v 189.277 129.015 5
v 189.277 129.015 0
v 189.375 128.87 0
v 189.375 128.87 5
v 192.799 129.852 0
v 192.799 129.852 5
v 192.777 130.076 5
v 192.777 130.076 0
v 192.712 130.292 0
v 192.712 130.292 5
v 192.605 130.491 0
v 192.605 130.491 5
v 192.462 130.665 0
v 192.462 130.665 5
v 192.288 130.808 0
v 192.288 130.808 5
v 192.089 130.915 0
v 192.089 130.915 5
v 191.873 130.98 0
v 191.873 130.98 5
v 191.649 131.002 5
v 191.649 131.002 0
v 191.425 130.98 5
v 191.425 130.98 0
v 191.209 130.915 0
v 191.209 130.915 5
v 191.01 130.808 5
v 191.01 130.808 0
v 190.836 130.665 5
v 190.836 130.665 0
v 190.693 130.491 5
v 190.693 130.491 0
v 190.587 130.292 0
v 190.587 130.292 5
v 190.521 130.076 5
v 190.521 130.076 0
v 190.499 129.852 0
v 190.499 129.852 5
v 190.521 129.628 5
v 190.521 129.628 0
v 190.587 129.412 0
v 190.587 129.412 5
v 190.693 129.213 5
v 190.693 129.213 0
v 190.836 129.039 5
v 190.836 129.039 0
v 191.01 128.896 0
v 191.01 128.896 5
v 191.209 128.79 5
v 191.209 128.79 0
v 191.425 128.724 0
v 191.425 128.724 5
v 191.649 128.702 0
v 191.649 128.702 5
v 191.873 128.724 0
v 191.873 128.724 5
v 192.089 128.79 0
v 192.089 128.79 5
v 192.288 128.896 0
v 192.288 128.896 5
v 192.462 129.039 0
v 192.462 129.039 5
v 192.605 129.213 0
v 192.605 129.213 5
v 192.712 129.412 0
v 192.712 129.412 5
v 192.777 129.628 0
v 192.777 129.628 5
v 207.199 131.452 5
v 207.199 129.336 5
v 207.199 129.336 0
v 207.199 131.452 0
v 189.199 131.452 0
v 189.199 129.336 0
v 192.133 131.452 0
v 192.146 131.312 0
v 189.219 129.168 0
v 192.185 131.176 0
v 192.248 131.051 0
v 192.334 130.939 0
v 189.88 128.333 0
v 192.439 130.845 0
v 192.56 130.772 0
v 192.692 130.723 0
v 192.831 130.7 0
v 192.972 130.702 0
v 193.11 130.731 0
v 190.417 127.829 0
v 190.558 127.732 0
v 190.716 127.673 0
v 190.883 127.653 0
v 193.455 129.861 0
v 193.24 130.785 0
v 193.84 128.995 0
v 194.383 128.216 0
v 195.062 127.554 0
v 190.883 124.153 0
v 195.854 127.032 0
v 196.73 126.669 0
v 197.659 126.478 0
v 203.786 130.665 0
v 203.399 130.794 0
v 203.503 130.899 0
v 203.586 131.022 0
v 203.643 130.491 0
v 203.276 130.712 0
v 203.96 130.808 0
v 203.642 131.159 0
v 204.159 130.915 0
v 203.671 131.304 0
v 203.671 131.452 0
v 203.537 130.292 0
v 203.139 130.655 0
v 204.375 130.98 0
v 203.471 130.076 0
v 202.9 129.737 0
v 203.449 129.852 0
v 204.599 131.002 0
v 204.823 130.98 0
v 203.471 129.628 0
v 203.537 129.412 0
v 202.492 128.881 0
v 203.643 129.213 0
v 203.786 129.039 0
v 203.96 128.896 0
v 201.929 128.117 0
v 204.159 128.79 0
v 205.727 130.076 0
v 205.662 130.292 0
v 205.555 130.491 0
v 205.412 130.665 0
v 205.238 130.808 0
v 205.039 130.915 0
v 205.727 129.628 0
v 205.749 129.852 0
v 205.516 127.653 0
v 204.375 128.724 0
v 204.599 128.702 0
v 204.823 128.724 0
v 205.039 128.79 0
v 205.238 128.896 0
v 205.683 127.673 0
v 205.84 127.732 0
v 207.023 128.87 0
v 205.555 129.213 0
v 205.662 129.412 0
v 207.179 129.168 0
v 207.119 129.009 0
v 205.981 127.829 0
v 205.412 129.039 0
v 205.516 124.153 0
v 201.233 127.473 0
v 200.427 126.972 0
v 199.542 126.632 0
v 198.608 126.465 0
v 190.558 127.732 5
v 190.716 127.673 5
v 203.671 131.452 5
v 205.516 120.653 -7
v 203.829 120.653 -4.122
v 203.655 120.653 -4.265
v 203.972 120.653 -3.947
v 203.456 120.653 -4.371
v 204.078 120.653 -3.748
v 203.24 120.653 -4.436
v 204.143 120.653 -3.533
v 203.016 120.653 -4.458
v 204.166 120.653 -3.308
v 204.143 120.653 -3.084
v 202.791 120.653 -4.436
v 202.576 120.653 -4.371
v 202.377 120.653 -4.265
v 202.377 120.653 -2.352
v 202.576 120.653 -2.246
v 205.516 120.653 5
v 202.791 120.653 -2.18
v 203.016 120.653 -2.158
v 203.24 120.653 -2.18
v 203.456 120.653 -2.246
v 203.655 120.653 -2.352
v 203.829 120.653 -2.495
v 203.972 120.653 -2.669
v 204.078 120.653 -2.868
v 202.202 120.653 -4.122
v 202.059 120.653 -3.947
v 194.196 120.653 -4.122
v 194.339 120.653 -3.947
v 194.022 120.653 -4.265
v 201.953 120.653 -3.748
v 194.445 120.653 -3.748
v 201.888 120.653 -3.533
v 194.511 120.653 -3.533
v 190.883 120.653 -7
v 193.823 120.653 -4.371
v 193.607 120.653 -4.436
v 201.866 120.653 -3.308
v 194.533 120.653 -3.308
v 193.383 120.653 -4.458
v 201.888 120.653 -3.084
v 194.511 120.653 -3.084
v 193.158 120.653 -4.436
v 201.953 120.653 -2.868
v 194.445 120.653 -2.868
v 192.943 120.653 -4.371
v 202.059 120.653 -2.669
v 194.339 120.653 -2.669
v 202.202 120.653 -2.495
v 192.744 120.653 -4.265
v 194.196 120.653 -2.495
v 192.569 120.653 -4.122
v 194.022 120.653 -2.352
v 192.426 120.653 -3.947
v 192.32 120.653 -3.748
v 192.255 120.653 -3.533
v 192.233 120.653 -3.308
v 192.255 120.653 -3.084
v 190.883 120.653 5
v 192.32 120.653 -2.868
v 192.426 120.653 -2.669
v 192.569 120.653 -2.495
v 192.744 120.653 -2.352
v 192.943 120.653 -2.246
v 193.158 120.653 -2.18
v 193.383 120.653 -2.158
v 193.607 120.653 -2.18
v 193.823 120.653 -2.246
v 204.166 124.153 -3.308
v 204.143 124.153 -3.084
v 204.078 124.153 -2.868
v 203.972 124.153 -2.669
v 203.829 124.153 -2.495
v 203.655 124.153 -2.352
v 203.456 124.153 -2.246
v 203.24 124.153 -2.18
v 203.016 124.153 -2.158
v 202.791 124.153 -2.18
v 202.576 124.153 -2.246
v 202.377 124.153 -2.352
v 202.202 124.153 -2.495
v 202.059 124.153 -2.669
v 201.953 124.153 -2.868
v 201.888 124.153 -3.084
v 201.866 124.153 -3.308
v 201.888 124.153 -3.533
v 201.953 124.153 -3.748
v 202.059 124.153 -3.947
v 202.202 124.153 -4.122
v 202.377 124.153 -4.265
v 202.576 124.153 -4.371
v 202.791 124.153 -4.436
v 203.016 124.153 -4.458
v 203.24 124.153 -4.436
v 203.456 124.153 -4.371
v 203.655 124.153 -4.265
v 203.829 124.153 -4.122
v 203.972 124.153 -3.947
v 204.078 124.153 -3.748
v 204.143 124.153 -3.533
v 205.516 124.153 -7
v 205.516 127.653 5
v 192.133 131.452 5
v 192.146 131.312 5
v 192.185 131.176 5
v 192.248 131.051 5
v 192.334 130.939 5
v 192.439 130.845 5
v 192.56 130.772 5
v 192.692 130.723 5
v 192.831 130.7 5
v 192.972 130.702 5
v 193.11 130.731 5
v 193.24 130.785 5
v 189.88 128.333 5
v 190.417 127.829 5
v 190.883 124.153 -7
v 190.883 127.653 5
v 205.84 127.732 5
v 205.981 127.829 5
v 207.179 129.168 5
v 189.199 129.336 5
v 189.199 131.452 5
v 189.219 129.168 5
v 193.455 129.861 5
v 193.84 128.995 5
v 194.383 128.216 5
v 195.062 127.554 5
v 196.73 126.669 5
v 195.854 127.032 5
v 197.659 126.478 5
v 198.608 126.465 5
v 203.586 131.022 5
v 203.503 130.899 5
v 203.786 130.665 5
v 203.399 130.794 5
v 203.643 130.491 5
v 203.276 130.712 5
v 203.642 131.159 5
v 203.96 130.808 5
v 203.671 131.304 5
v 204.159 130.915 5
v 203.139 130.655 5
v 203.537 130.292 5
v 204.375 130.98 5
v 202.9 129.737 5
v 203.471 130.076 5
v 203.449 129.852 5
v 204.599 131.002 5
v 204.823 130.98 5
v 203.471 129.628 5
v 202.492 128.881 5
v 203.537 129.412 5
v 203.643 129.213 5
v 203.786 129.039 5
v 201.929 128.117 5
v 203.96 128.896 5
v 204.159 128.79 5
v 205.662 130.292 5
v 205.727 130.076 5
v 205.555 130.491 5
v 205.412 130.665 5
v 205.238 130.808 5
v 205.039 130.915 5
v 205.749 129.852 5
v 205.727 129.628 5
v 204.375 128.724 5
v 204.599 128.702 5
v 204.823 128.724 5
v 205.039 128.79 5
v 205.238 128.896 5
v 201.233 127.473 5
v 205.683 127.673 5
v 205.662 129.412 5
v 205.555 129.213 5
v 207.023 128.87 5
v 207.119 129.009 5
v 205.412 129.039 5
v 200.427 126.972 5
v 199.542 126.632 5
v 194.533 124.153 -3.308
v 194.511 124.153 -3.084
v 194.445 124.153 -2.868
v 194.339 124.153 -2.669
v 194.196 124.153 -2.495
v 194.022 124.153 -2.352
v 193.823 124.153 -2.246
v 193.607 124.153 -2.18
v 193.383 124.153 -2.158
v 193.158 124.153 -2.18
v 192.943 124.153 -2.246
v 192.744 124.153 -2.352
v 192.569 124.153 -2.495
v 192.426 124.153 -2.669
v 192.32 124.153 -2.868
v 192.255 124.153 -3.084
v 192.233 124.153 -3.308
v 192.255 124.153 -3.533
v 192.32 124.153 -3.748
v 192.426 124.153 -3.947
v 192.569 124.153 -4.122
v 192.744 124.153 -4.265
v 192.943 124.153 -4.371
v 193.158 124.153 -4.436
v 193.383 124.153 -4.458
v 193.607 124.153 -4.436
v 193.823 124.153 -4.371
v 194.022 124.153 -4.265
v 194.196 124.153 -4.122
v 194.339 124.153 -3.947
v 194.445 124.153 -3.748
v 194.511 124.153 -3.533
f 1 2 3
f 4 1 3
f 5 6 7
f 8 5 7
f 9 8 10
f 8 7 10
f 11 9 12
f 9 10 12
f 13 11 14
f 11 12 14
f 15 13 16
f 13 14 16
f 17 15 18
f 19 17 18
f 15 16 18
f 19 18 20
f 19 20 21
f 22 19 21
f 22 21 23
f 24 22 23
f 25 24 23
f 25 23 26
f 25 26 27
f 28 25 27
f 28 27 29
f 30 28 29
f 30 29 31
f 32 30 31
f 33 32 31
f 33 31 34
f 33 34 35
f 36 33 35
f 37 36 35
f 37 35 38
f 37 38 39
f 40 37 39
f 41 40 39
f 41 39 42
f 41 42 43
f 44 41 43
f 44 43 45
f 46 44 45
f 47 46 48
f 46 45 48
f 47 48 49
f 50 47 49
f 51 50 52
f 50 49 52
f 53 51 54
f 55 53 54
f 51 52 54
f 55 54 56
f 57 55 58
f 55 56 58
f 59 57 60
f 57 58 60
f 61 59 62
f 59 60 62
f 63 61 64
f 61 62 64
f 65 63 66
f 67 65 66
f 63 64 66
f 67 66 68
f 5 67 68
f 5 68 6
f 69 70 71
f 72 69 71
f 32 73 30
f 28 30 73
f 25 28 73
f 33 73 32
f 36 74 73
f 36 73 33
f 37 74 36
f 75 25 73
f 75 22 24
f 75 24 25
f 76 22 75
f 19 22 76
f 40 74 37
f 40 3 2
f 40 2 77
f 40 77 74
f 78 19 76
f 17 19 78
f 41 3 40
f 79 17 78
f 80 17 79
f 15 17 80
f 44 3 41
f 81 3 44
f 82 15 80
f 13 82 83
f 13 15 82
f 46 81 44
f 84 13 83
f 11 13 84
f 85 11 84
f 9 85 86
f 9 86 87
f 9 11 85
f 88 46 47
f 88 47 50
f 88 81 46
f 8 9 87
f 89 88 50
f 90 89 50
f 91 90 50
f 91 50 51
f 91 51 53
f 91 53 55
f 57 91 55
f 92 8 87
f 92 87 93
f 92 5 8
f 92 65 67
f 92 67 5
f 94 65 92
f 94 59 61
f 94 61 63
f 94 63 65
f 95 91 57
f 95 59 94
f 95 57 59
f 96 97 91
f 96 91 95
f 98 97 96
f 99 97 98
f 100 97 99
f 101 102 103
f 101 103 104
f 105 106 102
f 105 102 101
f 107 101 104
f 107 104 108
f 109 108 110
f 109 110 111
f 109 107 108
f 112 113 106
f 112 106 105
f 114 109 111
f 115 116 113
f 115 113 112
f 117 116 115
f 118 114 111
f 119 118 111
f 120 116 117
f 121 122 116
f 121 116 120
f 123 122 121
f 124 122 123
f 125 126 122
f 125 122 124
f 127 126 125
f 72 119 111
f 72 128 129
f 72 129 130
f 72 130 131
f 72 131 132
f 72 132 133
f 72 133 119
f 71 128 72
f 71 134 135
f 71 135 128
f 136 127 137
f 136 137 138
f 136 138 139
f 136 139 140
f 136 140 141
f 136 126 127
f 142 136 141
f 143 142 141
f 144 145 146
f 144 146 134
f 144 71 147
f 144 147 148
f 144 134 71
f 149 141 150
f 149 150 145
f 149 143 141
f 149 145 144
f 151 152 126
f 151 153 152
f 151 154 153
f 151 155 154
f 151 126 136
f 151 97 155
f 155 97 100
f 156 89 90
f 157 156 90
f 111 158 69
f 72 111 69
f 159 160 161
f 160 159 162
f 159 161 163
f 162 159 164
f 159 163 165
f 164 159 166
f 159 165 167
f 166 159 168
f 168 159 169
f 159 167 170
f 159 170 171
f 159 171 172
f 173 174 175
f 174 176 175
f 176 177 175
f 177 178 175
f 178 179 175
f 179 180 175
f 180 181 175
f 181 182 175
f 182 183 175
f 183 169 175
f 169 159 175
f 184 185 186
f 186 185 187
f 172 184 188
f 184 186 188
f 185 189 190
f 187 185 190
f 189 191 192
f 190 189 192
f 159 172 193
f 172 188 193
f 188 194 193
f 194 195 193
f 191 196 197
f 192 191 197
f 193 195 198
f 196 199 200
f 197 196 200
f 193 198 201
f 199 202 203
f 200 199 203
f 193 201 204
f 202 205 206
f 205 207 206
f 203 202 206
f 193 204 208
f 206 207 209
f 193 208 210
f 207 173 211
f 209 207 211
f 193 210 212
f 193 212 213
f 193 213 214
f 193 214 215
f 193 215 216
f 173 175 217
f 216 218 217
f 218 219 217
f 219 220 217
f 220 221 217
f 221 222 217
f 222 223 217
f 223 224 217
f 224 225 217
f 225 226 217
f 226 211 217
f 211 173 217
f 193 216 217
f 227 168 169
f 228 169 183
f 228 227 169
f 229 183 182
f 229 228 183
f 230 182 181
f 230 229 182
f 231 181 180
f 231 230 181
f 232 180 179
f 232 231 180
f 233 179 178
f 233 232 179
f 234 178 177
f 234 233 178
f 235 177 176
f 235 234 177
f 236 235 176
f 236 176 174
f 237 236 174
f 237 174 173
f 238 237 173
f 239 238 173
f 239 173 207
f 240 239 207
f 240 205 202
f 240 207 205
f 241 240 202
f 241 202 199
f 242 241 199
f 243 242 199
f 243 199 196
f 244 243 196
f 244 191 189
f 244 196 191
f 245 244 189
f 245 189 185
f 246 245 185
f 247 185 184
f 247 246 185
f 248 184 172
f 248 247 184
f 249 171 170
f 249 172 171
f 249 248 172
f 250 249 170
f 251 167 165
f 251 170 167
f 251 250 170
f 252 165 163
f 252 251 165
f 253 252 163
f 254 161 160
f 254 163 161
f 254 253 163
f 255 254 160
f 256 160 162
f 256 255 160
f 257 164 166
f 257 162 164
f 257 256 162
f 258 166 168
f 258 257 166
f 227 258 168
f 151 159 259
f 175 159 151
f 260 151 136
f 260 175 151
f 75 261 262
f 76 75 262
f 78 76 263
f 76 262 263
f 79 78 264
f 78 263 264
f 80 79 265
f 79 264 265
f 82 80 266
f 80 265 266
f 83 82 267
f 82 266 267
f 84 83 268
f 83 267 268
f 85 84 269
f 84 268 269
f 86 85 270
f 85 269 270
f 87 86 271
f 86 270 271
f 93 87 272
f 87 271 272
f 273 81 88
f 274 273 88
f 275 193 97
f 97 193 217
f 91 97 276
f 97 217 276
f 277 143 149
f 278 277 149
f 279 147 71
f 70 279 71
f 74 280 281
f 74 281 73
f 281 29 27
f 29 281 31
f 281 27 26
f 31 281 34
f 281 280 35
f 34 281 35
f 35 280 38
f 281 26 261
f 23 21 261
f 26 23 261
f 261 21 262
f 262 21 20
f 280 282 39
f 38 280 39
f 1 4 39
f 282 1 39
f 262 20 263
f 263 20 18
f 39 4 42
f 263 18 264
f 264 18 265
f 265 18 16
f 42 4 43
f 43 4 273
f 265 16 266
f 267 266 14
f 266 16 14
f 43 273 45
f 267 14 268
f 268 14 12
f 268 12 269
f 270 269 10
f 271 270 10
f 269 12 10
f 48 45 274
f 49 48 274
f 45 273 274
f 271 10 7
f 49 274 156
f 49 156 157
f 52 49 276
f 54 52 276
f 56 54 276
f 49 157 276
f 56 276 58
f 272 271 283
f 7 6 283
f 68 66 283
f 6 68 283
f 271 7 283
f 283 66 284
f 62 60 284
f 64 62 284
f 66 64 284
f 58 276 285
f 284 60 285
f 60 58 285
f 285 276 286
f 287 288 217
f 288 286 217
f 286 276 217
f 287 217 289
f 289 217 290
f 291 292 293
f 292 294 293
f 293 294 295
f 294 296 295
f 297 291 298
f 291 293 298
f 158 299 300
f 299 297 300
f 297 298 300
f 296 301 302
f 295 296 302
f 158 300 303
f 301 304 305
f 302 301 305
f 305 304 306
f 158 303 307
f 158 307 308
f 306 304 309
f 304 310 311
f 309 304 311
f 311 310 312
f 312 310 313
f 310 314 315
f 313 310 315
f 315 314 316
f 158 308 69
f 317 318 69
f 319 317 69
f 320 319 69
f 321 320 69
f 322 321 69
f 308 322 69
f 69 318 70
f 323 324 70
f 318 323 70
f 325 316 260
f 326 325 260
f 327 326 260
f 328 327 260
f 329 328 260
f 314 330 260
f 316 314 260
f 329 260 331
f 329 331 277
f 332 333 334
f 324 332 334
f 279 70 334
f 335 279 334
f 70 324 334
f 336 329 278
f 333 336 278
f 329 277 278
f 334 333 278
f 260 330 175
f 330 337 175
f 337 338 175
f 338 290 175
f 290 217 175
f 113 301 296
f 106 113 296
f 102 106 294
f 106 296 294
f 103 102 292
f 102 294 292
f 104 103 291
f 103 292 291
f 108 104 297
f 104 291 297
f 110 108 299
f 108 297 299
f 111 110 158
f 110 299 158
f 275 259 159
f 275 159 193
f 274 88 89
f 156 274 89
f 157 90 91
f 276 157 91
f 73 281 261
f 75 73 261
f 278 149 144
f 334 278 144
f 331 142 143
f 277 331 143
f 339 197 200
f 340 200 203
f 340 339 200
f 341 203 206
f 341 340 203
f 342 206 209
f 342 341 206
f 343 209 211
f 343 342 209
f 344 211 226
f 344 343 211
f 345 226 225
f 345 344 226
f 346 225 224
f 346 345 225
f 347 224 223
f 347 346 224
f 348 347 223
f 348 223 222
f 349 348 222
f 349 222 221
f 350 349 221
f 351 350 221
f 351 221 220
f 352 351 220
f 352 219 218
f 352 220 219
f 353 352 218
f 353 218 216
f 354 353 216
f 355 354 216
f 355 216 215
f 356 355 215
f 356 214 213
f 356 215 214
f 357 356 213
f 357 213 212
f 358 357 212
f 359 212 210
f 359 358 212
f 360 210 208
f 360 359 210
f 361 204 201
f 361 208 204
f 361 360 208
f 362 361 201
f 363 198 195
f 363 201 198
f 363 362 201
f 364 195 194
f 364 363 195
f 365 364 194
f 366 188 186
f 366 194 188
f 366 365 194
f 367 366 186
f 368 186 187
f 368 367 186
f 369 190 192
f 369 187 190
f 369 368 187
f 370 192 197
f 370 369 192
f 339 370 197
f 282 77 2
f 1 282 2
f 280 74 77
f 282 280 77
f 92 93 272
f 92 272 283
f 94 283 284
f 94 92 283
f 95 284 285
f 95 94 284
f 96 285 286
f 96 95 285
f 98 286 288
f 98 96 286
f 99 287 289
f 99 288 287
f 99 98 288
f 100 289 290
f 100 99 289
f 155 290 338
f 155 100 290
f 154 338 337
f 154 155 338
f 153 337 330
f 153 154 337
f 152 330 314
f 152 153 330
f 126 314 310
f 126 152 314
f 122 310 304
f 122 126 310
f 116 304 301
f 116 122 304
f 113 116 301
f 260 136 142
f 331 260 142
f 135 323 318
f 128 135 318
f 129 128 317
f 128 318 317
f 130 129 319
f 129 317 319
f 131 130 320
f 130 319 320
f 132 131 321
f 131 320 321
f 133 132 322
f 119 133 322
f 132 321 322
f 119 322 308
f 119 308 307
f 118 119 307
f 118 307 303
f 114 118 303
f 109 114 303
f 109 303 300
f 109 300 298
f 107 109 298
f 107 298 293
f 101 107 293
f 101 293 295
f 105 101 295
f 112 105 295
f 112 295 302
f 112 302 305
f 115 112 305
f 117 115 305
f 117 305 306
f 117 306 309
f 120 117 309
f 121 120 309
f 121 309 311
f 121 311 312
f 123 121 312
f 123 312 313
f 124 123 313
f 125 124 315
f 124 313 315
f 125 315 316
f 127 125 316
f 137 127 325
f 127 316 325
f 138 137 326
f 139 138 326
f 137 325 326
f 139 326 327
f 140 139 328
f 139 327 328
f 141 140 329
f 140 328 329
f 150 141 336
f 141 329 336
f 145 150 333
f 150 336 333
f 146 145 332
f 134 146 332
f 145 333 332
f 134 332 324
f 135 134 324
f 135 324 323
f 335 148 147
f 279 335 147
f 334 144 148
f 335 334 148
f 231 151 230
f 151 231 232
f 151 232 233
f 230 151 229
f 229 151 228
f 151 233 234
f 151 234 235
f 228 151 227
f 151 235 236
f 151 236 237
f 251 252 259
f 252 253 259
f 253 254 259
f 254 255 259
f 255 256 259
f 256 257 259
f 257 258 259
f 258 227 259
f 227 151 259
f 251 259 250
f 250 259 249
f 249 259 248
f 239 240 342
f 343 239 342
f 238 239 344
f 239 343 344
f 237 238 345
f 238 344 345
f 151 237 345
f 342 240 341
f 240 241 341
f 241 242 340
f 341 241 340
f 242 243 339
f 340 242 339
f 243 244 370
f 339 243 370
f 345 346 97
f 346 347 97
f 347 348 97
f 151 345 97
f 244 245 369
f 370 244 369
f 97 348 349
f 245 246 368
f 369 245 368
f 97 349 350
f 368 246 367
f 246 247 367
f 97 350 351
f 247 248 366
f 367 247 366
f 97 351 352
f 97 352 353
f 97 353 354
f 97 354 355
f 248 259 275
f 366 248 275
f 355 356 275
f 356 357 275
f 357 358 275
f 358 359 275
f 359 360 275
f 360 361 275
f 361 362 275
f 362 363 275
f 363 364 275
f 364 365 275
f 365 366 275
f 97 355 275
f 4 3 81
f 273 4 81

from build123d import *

# Parameters (mm, degrees)
FACE_2_DEPTH            = 5
SKETCH2_W               = 14.632926246
SKETCH2_H               = 5
BOSS_EXTRUDE2_DEPTH     = 7
SKETCH3_W               = 14.632926246
SKETCH3_H               = 7
BOSS_EXTRUDE3_DEPTH     = 7
EYE_HOLES_REACH         = 248.075
SKETCH4_R               = 1.15
SKETCH5_W               = 14.632926246
SKETCH5_H               = 3.5
SEAT_DEPTH              = 7
SKETCH6_W               = 18
SKETCH6_H               = 5
BOSS_EXTRUDE4_DEPTH     = 3.5
SKETCH7_W               = 18.025006546
SKETCH7_H               = 4.25
TOP_HOLE_DEPTH          = 248.972829901
MIDDLE_HOLE_DEPTH       = 246.672789516
MIDDLE_HOLE_DEPTH_BACK  = 246.672789516
SKETCH8_R               = 5.003684601
CUT_EXTRUDE8_DEPTH      = 208.598432106
CUT_EXTRUDE8_DEPTH_BACK = 3.5
SKETCH10_R              = 1.15
SKETCH11_R              = 0.754398486
CUT_EXTRUDE9_DEPTH      = 246.672789516


with BuildPart() as part:
    # Sketch1 → Face 2 (new body)
    with BuildSketch(Plane.XY):
        Polygon((189.199131389, 129.336090234), (189.219408928, 129.168352428), (189.276625012, 129.01501095), (189.375109043, 128.870497126), (189.879763338, 128.333185306), (190.417075159, 127.828531011), (190.558185088, 127.731803407), (190.715733881, 127.672634267), (190.882668266, 127.652553357), (205.515594512, 127.652553357), (205.683332318, 127.672830896), (205.84007769, 127.731803407), (205.98118762, 127.828531011), (207.023153735, 128.870497126), (207.118523911, 129.009007135), (207.17885385, 129.168352428), (207.199131389, 129.336090234), (207.199131389, 132.202042434), (189.199131389, 132.202042434), align=None)
    extrude(amount=FACE_2_DEPTH)

    # Sketch2 → Boss-Extrude2 (add)
    with BuildSketch(Plane.XZ.offset(-127.652553357)):
        with Locations((198.199131389, 2.5)):
            Rectangle(SKETCH2_W, SKETCH2_H)
    extrude(amount=BOSS_EXTRUDE2_DEPTH)

    # Sketch3 → Boss-Extrude3 (add)
    with BuildSketch(Plane(origin=(0, 0, 0), x_dir=(-1, 0, 0), z_dir=(0, 0, -1))):
        with Locations((-198.199131389, 124.152553357)):
            Rectangle(SKETCH3_W, SKETCH3_H)
    extrude(amount=BOSS_EXTRUDE3_DEPTH)

    # Sketch4 → Eye Holes (cut, up to next)
    with BuildSketch(Plane.XY.offset(5), mode=Mode.PRIVATE) as eye_holes_sk1:
        with Locations((191.649131389, 129.852042434)):
            Circle(SKETCH4_R)
    eye_holes_tool1 = extrude(eye_holes_sk1.sketch, amount=-EYE_HOLES_REACH, mode=Mode.PRIVATE) & part.part
    # Sketch4 → Eye Holes (cut, up to next)
    with BuildSketch(Plane.XY.offset(5), mode=Mode.PRIVATE) as eye_holes_sk2:
        with Locations((204.599131389, 129.852042434)):
            Circle(SKETCH4_R)
    eye_holes_tool2 = extrude(eye_holes_sk2.sketch, amount=-EYE_HOLES_REACH, mode=Mode.PRIVATE) & part.part
    add(eye_holes_tool1.solids().sort_by_distance((191.649131, 129.852042, 5))[0], mode=Mode.SUBTRACT)
    add(eye_holes_tool2.solids().sort_by_distance((204.599131, 129.852042, 5))[0], mode=Mode.SUBTRACT)

    # Sketch5 → Seat (cut)
    with BuildSketch(Plane(origin=(0, 0, -7), x_dir=(-1, 0, 0), z_dir=(0, 0, -1))):
        with Locations((-198.199131389, 125.902553357)):
            Rectangle(SKETCH5_W, SKETCH5_H)
    extrude(amount=-SEAT_DEPTH, mode=Mode.SUBTRACT)

    # Sketch6 → Boss-Extrude4 (add)
    with BuildSketch(Plane(origin=(0, 132.202042434, 0), x_dir=(1, 0, 0), z_dir=(0, 1, 0))):
        with Locations((198.199131389, -2.5)):
            Rectangle(SKETCH6_W, SKETCH6_H)
    extrude(amount=BOSS_EXTRUDE4_DEPTH)

    # Sketch7 → Top Hole (cut, through all)
    with BuildSketch(Plane.XY.offset(5)):
        with Locations((198.194207579, 133.577042434)):
            Rectangle(SKETCH7_W, SKETCH7_H)
    extrude(amount=-TOP_HOLE_DEPTH, mode=Mode.SUBTRACT)

    # Sketch8 → Middle Hole (cut, two sides: drawn at the far end of the back side and taken through both)
    with BuildSketch(Plane.XY.offset(5).offset(-MIDDLE_HOLE_DEPTH_BACK)):
        with Locations((198.199131389, 131.452042434)):
            Circle(SKETCH8_R)
    extrude(amount=MIDDLE_HOLE_DEPTH + MIDDLE_HOLE_DEPTH_BACK, mode=Mode.SUBTRACT)

    # Sketch10 → Cut-Extrude8 (cut, two sides: drawn at the far end of the back side and taken through both)
    with BuildSketch(Plane.XZ.offset(-120.652553357).offset(-CUT_EXTRUDE8_DEPTH_BACK)):
        with Locations((193.382668266, -3.308334882)):
            Circle(SKETCH10_R)
        with Locations((203.015594512, -3.308334882)):
            Circle(SKETCH10_R)
    extrude(amount=CUT_EXTRUDE8_DEPTH + CUT_EXTRUDE8_DEPTH_BACK, mode=Mode.SUBTRACT)

    # Sketch11 → Cut-Extrude9 (cut, through all)
    with BuildSketch(Plane.XY.offset(5)):
        with Locations((192.88691871, 131.452042434)):
            Circle(SKETCH11_R)
        with Locations((202.919958348, 131.377258625)):
            Circle(SKETCH11_R)
    extrude(amount=-CUT_EXTRUDE9_DEPTH, mode=Mode.SUBTRACT)


solid = part.part
